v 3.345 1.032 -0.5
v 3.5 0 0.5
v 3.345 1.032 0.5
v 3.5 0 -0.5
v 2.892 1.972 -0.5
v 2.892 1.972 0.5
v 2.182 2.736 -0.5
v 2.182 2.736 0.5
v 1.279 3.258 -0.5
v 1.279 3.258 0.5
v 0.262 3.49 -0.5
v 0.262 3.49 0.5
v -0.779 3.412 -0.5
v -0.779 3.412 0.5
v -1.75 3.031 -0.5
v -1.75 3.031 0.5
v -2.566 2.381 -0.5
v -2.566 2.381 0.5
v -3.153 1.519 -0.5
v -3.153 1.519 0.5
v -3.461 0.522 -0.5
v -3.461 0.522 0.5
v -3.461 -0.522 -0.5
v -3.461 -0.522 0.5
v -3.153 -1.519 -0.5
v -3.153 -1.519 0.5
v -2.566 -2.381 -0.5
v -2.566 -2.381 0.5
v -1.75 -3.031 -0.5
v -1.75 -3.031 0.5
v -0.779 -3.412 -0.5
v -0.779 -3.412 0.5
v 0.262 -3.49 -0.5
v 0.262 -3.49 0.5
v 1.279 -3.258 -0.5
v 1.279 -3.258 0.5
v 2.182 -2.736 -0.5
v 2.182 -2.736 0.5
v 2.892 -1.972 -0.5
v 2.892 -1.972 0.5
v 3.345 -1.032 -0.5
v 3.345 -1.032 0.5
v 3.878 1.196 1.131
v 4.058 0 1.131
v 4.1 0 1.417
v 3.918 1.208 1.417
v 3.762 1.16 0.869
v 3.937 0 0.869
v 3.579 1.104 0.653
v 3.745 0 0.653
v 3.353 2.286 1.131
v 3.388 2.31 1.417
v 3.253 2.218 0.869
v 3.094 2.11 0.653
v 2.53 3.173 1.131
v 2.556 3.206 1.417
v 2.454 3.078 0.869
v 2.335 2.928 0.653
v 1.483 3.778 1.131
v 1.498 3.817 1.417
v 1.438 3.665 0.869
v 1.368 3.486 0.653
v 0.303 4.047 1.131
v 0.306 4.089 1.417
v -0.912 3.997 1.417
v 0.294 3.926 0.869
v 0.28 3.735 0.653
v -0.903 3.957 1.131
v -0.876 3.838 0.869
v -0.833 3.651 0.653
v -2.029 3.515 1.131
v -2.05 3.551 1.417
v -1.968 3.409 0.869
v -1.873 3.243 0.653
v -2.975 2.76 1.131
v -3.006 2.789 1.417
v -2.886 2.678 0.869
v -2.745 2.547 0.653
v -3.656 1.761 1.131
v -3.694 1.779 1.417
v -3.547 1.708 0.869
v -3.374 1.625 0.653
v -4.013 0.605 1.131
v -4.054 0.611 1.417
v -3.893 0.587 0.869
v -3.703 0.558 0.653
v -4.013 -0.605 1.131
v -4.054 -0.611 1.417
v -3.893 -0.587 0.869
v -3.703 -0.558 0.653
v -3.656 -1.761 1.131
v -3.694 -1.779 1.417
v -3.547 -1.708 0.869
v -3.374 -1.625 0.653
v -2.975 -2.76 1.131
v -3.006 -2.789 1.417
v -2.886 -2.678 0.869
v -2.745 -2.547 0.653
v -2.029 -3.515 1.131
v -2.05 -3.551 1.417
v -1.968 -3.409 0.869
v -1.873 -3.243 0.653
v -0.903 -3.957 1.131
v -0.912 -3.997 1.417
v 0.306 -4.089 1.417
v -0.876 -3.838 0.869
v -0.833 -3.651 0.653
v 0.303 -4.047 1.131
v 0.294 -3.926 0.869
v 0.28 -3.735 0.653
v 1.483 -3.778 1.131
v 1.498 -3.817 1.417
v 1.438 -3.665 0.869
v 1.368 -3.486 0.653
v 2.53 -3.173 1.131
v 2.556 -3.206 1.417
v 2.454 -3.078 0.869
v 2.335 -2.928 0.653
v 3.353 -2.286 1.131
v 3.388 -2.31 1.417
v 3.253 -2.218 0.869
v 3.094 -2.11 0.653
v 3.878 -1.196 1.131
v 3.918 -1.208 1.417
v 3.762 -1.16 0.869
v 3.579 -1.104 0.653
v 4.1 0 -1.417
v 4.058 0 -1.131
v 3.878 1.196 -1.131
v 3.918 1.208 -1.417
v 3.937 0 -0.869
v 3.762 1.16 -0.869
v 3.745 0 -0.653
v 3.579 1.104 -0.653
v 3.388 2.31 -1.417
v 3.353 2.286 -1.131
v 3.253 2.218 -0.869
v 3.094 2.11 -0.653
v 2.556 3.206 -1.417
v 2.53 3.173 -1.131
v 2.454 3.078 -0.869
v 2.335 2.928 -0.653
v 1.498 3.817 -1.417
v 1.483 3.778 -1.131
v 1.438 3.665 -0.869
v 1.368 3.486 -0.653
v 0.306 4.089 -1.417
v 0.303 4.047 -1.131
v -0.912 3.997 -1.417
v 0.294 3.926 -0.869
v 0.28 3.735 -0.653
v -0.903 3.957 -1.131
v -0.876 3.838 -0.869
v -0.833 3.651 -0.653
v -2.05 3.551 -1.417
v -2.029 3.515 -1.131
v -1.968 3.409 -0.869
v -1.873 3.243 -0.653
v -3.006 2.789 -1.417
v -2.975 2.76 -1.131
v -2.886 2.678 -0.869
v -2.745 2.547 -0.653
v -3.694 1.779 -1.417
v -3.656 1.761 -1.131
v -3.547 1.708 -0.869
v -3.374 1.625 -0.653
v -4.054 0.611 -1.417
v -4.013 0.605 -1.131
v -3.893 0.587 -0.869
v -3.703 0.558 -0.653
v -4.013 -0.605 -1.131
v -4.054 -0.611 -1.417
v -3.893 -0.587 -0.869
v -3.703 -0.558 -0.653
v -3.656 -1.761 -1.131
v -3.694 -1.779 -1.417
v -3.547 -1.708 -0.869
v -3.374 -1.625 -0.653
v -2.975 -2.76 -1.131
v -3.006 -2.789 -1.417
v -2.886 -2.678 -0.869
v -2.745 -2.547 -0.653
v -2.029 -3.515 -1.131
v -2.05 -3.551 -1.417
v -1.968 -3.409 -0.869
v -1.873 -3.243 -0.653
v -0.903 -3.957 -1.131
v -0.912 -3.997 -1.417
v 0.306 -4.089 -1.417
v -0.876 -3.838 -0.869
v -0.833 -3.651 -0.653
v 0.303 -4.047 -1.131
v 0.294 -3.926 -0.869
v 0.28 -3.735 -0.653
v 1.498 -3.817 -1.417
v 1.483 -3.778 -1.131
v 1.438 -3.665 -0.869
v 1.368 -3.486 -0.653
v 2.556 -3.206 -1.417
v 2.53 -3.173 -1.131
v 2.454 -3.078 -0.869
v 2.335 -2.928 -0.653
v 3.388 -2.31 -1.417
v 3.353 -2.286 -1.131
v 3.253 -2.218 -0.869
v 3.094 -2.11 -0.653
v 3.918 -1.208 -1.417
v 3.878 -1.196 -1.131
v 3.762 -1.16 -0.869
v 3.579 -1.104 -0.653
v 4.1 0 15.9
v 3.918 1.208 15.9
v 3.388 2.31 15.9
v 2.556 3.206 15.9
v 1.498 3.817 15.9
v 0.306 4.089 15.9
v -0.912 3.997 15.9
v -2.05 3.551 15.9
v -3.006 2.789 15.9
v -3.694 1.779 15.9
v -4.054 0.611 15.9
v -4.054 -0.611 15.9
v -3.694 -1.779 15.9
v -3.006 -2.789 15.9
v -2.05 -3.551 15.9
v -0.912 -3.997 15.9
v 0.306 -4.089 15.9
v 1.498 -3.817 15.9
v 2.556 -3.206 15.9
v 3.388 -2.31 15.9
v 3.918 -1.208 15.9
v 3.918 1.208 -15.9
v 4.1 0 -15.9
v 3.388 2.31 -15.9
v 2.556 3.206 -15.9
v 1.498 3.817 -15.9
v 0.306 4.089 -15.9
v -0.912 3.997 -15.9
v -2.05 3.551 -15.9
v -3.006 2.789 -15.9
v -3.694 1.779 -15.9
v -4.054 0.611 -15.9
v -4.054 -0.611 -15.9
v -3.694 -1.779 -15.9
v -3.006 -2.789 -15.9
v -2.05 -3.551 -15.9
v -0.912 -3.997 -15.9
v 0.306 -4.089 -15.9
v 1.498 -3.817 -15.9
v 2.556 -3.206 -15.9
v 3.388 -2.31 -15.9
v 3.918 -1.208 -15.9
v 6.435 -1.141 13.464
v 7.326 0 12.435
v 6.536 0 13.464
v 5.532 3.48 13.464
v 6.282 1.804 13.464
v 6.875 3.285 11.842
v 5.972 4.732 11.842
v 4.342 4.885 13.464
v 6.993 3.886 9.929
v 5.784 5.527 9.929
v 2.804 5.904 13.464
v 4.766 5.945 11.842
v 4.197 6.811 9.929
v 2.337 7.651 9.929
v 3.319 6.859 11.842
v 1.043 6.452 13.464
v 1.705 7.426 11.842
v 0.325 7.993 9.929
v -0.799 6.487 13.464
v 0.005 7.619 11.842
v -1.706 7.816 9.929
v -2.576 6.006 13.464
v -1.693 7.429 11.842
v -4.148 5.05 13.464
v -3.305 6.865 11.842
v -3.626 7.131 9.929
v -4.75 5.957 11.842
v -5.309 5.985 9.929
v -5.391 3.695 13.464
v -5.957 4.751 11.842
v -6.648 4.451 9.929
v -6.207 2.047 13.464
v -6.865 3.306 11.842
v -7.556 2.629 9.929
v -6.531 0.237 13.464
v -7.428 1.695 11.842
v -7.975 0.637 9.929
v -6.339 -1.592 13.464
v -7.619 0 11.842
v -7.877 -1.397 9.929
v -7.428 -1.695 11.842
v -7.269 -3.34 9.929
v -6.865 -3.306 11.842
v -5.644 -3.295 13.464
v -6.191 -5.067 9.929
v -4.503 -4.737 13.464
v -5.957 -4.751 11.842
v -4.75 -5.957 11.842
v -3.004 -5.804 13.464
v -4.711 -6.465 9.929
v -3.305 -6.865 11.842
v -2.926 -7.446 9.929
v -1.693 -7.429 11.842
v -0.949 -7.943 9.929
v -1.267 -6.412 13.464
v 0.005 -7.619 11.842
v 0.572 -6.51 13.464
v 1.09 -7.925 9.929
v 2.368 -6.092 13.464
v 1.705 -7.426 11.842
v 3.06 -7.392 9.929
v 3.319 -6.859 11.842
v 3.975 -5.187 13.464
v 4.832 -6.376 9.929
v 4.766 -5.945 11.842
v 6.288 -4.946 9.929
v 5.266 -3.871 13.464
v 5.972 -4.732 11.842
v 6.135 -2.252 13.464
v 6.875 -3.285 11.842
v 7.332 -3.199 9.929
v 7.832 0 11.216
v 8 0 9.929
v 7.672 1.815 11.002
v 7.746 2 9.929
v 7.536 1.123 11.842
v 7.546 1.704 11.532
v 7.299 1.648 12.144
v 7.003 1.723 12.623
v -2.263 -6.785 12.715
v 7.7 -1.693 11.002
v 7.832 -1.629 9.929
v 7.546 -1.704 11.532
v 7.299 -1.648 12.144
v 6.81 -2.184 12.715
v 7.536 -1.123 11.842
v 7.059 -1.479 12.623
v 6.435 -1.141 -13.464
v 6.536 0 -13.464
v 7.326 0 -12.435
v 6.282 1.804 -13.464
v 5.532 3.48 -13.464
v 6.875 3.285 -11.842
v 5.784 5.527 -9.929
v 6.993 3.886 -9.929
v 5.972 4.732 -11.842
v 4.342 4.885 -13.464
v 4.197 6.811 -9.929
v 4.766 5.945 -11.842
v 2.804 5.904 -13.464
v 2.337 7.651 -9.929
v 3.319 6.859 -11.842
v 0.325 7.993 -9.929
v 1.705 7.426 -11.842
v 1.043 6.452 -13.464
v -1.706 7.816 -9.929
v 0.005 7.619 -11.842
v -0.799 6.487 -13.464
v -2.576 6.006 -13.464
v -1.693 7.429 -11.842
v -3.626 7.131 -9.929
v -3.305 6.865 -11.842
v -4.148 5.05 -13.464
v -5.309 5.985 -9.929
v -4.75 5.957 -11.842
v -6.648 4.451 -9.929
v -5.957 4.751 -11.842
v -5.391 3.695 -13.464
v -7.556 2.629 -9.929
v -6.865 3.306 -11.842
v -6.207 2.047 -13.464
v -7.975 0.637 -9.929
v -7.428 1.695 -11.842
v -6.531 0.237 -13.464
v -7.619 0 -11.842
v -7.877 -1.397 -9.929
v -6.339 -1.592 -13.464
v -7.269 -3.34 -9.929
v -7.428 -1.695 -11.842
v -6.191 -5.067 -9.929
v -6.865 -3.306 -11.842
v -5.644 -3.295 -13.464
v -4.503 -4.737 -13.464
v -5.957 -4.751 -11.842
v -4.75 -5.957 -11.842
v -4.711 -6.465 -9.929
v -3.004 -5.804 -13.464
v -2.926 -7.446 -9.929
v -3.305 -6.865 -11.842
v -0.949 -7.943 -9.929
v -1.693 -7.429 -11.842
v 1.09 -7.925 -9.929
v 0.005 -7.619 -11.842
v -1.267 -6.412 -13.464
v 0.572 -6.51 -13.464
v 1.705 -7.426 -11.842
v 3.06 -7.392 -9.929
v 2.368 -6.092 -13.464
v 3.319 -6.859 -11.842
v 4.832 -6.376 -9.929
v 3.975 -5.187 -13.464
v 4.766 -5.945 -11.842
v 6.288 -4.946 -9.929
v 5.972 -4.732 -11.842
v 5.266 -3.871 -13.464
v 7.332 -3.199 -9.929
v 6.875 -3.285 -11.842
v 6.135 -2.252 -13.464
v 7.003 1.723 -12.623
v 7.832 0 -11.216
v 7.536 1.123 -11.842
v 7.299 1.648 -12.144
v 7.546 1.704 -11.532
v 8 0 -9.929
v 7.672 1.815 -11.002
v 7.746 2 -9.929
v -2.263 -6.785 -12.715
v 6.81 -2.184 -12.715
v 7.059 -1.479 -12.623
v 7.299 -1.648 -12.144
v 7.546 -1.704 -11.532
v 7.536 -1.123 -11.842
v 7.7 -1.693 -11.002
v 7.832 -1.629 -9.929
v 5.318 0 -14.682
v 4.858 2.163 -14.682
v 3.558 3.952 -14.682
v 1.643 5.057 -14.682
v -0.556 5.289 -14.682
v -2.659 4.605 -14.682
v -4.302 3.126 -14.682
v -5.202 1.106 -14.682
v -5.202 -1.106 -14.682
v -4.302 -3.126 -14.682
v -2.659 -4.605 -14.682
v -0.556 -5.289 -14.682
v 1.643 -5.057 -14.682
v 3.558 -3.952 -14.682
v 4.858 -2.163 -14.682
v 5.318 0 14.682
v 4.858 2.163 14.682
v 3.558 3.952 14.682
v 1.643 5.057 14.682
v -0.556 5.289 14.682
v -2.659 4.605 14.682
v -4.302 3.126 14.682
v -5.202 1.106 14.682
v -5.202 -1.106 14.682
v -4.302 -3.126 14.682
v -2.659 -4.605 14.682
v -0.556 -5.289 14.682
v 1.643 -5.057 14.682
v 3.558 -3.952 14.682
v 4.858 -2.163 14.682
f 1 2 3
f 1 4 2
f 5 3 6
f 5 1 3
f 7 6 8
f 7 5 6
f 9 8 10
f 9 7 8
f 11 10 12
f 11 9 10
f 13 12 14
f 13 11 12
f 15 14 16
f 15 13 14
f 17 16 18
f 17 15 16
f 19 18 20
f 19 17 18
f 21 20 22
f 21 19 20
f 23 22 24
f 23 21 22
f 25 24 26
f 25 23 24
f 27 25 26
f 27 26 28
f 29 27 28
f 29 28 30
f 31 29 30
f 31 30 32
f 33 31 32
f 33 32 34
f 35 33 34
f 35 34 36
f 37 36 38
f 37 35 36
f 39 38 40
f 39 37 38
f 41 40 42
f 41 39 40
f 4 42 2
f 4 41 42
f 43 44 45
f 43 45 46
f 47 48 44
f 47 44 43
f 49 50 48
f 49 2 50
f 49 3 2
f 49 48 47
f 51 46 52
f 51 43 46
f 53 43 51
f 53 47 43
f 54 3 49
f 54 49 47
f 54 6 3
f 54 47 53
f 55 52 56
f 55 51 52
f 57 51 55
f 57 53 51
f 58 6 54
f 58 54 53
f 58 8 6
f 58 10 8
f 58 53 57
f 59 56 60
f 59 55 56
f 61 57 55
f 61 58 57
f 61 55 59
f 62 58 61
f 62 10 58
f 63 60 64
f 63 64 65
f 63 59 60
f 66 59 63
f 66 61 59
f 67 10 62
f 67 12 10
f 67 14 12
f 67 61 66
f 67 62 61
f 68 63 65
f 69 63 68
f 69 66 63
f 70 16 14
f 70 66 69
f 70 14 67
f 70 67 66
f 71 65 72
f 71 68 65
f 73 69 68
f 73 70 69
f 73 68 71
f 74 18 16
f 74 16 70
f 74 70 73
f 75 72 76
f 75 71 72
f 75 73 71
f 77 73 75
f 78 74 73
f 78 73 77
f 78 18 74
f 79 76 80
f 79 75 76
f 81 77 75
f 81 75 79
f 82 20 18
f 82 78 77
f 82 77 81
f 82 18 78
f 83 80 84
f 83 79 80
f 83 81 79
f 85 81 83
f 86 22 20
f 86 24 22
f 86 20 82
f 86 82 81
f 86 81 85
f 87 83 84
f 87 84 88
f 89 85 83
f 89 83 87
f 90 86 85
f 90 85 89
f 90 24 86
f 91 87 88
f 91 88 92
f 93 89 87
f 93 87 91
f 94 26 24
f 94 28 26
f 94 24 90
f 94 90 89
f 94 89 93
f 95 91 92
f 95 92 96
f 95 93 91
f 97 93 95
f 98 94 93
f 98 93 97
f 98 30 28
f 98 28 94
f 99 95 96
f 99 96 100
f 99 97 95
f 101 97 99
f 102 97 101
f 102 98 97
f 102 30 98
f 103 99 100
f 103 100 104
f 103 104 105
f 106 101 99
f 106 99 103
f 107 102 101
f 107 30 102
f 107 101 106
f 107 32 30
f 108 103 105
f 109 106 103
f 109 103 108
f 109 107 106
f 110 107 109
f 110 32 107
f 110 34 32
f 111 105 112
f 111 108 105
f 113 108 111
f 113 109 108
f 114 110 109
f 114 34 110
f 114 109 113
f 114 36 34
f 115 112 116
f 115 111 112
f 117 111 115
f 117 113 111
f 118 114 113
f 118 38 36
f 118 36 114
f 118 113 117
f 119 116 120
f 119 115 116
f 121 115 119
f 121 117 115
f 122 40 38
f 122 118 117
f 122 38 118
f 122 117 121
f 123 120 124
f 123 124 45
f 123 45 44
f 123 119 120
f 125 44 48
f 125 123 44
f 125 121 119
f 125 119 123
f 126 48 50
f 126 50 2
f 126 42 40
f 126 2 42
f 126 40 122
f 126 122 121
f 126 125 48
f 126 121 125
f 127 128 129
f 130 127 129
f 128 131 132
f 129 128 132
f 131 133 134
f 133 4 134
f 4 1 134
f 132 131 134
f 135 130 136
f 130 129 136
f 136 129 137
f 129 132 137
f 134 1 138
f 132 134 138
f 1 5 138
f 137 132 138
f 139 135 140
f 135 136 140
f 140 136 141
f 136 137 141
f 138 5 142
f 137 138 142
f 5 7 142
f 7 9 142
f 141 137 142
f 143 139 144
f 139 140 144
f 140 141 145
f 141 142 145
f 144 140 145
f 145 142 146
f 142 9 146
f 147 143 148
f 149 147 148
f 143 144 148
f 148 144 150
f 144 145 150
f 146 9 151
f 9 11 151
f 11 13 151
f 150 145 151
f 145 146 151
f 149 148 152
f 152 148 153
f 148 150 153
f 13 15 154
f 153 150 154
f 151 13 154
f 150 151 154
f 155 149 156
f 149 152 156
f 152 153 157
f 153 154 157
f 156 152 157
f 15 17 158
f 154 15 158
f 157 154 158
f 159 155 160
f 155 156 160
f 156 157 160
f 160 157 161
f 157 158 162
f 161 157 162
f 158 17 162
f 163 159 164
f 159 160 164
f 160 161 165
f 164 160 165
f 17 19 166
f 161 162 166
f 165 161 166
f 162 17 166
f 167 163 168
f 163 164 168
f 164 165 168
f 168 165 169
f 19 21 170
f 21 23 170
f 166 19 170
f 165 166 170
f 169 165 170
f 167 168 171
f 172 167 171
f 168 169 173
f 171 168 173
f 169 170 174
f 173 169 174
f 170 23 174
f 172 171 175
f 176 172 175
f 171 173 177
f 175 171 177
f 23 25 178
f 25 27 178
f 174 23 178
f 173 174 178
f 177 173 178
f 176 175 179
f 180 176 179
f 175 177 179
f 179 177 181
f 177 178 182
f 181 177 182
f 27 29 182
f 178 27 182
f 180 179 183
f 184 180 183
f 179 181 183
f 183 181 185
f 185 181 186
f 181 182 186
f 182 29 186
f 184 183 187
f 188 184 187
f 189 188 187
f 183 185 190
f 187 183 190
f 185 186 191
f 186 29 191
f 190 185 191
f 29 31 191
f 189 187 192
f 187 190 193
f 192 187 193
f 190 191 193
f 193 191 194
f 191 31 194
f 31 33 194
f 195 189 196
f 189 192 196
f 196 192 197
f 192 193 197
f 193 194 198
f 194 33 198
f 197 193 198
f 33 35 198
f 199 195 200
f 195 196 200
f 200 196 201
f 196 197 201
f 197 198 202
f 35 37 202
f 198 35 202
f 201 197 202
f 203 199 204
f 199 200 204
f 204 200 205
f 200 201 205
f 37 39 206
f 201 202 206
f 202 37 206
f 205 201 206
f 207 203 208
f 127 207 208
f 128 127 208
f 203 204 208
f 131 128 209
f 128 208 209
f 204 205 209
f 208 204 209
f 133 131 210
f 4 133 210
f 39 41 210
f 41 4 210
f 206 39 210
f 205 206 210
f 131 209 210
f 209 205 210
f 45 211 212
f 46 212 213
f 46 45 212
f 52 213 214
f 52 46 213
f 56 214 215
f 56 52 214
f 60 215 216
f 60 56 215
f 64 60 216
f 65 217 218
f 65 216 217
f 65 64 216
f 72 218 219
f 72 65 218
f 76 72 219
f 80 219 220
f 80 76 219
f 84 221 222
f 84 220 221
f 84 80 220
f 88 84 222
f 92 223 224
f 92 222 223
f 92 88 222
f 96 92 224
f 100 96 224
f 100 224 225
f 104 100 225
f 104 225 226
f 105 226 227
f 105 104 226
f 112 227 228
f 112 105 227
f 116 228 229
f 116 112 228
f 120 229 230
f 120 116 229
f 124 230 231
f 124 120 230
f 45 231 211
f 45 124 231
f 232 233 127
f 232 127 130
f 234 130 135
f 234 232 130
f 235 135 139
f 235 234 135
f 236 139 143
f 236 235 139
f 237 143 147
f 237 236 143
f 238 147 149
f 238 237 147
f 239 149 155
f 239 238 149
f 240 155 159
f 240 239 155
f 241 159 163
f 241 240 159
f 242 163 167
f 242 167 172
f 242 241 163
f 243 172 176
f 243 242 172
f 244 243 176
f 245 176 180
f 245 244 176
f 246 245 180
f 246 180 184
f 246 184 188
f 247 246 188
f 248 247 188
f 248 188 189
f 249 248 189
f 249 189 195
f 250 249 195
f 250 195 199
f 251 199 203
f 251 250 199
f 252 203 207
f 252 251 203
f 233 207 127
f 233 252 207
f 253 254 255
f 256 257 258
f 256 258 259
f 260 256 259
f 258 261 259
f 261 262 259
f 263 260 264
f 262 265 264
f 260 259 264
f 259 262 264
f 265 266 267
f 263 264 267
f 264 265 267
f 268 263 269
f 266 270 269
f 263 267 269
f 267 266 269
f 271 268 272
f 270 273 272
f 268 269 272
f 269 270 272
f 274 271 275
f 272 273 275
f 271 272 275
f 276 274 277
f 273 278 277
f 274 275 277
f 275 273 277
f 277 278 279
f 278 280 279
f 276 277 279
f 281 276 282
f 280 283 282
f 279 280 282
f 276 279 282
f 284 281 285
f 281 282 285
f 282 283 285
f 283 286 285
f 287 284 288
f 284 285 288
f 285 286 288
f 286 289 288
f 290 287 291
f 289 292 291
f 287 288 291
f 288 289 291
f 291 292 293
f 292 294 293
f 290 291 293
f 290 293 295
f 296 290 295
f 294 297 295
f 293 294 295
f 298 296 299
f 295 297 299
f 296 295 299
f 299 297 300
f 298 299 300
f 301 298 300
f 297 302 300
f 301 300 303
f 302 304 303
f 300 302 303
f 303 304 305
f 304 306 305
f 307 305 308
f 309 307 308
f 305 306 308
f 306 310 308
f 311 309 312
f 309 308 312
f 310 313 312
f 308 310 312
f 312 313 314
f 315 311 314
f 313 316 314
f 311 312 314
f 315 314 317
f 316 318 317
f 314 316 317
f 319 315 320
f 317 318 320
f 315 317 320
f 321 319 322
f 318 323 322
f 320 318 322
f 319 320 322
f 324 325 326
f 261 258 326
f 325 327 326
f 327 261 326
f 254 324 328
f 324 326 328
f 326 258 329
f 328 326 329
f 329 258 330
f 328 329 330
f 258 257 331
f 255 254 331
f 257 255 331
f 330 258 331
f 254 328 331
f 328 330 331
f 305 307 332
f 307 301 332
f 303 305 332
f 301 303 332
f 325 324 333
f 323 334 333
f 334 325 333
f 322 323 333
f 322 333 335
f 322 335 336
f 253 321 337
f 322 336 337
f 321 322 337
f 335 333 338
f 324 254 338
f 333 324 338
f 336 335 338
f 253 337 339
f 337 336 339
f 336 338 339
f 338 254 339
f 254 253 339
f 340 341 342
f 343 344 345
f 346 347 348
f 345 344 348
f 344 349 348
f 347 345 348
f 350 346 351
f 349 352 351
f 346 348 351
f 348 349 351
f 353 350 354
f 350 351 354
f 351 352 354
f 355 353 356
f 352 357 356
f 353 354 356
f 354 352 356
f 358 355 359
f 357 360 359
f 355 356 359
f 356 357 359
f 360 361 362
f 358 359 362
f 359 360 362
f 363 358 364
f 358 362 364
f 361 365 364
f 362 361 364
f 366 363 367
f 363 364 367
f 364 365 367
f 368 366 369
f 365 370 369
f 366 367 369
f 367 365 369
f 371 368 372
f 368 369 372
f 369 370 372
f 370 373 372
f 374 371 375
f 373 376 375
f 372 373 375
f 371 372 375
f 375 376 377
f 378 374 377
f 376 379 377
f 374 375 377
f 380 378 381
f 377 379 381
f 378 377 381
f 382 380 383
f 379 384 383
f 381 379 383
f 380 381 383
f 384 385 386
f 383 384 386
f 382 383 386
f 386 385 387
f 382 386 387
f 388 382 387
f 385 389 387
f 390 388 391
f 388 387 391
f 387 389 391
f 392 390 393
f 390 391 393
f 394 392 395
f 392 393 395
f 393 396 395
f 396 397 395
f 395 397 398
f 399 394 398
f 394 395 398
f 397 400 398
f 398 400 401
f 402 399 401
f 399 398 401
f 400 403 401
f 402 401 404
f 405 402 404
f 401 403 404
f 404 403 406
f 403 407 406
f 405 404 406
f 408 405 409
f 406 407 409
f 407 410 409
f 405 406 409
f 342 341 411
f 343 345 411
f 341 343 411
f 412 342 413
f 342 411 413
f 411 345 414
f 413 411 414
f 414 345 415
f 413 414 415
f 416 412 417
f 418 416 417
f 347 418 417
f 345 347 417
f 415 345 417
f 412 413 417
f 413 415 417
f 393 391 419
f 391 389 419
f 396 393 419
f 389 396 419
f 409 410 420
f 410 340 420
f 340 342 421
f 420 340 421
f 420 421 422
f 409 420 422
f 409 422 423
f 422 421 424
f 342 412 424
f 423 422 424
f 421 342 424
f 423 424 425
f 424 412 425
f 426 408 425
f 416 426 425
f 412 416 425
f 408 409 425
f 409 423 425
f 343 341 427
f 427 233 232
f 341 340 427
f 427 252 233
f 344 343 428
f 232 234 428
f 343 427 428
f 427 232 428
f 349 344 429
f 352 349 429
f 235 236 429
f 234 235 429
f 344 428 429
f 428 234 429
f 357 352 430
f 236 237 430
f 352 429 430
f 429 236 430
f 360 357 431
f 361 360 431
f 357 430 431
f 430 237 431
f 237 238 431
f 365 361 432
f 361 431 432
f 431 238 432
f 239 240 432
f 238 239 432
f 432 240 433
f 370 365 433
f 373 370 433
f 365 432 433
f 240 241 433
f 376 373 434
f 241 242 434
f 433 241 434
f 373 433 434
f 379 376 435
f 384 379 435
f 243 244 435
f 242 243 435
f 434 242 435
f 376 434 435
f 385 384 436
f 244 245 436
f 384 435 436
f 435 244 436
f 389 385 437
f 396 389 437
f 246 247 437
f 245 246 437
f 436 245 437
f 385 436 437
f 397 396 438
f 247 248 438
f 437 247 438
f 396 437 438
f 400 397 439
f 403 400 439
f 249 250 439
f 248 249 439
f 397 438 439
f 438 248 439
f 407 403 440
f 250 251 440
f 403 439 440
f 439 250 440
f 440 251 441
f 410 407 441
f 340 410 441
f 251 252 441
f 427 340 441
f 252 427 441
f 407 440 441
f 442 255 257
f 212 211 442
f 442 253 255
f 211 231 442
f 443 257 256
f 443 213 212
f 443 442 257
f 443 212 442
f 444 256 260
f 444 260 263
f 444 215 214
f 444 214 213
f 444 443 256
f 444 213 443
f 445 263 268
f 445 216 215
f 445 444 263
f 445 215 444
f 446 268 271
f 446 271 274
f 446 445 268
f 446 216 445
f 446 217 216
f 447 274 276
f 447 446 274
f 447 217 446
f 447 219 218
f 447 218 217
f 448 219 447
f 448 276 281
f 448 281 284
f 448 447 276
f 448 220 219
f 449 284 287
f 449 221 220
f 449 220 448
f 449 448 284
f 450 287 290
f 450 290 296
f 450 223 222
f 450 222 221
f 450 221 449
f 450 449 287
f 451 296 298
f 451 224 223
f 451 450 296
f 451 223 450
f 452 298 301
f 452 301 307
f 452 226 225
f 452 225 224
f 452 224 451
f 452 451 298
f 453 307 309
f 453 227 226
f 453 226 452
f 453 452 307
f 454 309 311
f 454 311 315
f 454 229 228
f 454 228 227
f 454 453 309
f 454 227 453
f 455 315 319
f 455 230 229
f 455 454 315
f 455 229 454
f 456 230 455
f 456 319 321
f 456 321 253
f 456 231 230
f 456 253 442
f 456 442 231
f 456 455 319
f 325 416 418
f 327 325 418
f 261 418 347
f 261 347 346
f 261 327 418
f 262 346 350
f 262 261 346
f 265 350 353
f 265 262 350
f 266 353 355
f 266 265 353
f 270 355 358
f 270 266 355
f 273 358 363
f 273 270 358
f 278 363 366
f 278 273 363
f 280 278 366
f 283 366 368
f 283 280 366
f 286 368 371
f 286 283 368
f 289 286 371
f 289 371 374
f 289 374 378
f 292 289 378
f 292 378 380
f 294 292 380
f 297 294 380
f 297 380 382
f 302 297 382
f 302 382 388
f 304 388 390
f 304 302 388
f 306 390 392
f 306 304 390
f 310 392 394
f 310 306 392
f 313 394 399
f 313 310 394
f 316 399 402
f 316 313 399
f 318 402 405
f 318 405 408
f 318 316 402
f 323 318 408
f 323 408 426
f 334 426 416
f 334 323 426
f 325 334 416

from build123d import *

# Parameters (mm, degrees)
F0_R     = 4.1
F0_R_2   = 3.5
F1_DEPTH = 0.5
F0_R_3   = 8
F2_DEPTH = 16
F5_R     = 5


# Not quite as in the source:
# - a fillet or chamfer that OpenCascade refuses, or shapes differently, is made with other operations: its cross-section is extruded or revolved along the edge and cut away or added


with BuildPart() as f1:
    # F0 (on Top) → F1 (new body, symmetric)
    with BuildSketch(Plane.XY):
        Circle(F0_R)
        Circle(F0_R_2, mode=Mode.SUBTRACT)
    extrude(amount=F1_DEPTH, both=True)

    # F0 (on Top) → F2 (join, symmetric)
    with BuildSketch(Plane.XY):
        Circle(F0_R_3)
        Circle(F0_R, mode=Mode.SUBTRACT)
    extrude(amount=F2_DEPTH, both=True)

    # F3: fillet of radius 1 on 2 edges, made by hand

    # F3_s1 → F3_t2 (revolve)
    with BuildSketch(Plane.XZ):
        with BuildLine():
            ThreePointArc((4.1, 1.416515139), (3.9366600265, 0.8687925815), (3.5, 0.5))
            Line((3.5, 0.5), (4.1, 0.5))
            Line((4.1, 0.5), (4.1, 1.416515139))
        make_face()
    revolve(axis=Axis((0, 0, 0.5), (0, 0, 1)))

    # F3_s3 → F3_t4 (revolve)
    with BuildSketch(Plane.XZ):
        with BuildLine():
            ThreePointArc((4.1, -1.416515139), (3.9366600265, -0.8687925815), (3.5, -0.5))
            Line((3.5, -0.5), (4.1, -0.5))
            Line((4.1, -0.5), (4.1, -1.416515139))
        make_face()
    revolve(axis=Axis((0, 0, -0.5), (0, 0, 1)))

    # F4: chamfer of 4 on 2 edges, made by hand

    # F4_s1 → F4_t2 (revolve, cut)
    with BuildSketch(Plane.XZ):
        Polygon((8, -12), (4, -16), (8, -16), align=None)
    revolve(axis=Axis((0, 0, -16), (0, 0, 1)), mode=Mode.SUBTRACT)

    # F4_s3 → F4_t4 (revolve, cut)
    with BuildSketch(Plane.XZ):
        Polygon((8, 12), (4, 16), (8, 16), align=None)
    revolve(axis=Axis((0, 0, 16), (0, 0, 1)), mode=Mode.SUBTRACT)

    # F5
    f5_edges = [f1.edges().sort_by_distance(p)[0] for p in [
        (-8, 0, -12),
        (-8, 0, 12),
    ]]
    fillet(f5_edges, radius=F5_R)


solid = f1.part
